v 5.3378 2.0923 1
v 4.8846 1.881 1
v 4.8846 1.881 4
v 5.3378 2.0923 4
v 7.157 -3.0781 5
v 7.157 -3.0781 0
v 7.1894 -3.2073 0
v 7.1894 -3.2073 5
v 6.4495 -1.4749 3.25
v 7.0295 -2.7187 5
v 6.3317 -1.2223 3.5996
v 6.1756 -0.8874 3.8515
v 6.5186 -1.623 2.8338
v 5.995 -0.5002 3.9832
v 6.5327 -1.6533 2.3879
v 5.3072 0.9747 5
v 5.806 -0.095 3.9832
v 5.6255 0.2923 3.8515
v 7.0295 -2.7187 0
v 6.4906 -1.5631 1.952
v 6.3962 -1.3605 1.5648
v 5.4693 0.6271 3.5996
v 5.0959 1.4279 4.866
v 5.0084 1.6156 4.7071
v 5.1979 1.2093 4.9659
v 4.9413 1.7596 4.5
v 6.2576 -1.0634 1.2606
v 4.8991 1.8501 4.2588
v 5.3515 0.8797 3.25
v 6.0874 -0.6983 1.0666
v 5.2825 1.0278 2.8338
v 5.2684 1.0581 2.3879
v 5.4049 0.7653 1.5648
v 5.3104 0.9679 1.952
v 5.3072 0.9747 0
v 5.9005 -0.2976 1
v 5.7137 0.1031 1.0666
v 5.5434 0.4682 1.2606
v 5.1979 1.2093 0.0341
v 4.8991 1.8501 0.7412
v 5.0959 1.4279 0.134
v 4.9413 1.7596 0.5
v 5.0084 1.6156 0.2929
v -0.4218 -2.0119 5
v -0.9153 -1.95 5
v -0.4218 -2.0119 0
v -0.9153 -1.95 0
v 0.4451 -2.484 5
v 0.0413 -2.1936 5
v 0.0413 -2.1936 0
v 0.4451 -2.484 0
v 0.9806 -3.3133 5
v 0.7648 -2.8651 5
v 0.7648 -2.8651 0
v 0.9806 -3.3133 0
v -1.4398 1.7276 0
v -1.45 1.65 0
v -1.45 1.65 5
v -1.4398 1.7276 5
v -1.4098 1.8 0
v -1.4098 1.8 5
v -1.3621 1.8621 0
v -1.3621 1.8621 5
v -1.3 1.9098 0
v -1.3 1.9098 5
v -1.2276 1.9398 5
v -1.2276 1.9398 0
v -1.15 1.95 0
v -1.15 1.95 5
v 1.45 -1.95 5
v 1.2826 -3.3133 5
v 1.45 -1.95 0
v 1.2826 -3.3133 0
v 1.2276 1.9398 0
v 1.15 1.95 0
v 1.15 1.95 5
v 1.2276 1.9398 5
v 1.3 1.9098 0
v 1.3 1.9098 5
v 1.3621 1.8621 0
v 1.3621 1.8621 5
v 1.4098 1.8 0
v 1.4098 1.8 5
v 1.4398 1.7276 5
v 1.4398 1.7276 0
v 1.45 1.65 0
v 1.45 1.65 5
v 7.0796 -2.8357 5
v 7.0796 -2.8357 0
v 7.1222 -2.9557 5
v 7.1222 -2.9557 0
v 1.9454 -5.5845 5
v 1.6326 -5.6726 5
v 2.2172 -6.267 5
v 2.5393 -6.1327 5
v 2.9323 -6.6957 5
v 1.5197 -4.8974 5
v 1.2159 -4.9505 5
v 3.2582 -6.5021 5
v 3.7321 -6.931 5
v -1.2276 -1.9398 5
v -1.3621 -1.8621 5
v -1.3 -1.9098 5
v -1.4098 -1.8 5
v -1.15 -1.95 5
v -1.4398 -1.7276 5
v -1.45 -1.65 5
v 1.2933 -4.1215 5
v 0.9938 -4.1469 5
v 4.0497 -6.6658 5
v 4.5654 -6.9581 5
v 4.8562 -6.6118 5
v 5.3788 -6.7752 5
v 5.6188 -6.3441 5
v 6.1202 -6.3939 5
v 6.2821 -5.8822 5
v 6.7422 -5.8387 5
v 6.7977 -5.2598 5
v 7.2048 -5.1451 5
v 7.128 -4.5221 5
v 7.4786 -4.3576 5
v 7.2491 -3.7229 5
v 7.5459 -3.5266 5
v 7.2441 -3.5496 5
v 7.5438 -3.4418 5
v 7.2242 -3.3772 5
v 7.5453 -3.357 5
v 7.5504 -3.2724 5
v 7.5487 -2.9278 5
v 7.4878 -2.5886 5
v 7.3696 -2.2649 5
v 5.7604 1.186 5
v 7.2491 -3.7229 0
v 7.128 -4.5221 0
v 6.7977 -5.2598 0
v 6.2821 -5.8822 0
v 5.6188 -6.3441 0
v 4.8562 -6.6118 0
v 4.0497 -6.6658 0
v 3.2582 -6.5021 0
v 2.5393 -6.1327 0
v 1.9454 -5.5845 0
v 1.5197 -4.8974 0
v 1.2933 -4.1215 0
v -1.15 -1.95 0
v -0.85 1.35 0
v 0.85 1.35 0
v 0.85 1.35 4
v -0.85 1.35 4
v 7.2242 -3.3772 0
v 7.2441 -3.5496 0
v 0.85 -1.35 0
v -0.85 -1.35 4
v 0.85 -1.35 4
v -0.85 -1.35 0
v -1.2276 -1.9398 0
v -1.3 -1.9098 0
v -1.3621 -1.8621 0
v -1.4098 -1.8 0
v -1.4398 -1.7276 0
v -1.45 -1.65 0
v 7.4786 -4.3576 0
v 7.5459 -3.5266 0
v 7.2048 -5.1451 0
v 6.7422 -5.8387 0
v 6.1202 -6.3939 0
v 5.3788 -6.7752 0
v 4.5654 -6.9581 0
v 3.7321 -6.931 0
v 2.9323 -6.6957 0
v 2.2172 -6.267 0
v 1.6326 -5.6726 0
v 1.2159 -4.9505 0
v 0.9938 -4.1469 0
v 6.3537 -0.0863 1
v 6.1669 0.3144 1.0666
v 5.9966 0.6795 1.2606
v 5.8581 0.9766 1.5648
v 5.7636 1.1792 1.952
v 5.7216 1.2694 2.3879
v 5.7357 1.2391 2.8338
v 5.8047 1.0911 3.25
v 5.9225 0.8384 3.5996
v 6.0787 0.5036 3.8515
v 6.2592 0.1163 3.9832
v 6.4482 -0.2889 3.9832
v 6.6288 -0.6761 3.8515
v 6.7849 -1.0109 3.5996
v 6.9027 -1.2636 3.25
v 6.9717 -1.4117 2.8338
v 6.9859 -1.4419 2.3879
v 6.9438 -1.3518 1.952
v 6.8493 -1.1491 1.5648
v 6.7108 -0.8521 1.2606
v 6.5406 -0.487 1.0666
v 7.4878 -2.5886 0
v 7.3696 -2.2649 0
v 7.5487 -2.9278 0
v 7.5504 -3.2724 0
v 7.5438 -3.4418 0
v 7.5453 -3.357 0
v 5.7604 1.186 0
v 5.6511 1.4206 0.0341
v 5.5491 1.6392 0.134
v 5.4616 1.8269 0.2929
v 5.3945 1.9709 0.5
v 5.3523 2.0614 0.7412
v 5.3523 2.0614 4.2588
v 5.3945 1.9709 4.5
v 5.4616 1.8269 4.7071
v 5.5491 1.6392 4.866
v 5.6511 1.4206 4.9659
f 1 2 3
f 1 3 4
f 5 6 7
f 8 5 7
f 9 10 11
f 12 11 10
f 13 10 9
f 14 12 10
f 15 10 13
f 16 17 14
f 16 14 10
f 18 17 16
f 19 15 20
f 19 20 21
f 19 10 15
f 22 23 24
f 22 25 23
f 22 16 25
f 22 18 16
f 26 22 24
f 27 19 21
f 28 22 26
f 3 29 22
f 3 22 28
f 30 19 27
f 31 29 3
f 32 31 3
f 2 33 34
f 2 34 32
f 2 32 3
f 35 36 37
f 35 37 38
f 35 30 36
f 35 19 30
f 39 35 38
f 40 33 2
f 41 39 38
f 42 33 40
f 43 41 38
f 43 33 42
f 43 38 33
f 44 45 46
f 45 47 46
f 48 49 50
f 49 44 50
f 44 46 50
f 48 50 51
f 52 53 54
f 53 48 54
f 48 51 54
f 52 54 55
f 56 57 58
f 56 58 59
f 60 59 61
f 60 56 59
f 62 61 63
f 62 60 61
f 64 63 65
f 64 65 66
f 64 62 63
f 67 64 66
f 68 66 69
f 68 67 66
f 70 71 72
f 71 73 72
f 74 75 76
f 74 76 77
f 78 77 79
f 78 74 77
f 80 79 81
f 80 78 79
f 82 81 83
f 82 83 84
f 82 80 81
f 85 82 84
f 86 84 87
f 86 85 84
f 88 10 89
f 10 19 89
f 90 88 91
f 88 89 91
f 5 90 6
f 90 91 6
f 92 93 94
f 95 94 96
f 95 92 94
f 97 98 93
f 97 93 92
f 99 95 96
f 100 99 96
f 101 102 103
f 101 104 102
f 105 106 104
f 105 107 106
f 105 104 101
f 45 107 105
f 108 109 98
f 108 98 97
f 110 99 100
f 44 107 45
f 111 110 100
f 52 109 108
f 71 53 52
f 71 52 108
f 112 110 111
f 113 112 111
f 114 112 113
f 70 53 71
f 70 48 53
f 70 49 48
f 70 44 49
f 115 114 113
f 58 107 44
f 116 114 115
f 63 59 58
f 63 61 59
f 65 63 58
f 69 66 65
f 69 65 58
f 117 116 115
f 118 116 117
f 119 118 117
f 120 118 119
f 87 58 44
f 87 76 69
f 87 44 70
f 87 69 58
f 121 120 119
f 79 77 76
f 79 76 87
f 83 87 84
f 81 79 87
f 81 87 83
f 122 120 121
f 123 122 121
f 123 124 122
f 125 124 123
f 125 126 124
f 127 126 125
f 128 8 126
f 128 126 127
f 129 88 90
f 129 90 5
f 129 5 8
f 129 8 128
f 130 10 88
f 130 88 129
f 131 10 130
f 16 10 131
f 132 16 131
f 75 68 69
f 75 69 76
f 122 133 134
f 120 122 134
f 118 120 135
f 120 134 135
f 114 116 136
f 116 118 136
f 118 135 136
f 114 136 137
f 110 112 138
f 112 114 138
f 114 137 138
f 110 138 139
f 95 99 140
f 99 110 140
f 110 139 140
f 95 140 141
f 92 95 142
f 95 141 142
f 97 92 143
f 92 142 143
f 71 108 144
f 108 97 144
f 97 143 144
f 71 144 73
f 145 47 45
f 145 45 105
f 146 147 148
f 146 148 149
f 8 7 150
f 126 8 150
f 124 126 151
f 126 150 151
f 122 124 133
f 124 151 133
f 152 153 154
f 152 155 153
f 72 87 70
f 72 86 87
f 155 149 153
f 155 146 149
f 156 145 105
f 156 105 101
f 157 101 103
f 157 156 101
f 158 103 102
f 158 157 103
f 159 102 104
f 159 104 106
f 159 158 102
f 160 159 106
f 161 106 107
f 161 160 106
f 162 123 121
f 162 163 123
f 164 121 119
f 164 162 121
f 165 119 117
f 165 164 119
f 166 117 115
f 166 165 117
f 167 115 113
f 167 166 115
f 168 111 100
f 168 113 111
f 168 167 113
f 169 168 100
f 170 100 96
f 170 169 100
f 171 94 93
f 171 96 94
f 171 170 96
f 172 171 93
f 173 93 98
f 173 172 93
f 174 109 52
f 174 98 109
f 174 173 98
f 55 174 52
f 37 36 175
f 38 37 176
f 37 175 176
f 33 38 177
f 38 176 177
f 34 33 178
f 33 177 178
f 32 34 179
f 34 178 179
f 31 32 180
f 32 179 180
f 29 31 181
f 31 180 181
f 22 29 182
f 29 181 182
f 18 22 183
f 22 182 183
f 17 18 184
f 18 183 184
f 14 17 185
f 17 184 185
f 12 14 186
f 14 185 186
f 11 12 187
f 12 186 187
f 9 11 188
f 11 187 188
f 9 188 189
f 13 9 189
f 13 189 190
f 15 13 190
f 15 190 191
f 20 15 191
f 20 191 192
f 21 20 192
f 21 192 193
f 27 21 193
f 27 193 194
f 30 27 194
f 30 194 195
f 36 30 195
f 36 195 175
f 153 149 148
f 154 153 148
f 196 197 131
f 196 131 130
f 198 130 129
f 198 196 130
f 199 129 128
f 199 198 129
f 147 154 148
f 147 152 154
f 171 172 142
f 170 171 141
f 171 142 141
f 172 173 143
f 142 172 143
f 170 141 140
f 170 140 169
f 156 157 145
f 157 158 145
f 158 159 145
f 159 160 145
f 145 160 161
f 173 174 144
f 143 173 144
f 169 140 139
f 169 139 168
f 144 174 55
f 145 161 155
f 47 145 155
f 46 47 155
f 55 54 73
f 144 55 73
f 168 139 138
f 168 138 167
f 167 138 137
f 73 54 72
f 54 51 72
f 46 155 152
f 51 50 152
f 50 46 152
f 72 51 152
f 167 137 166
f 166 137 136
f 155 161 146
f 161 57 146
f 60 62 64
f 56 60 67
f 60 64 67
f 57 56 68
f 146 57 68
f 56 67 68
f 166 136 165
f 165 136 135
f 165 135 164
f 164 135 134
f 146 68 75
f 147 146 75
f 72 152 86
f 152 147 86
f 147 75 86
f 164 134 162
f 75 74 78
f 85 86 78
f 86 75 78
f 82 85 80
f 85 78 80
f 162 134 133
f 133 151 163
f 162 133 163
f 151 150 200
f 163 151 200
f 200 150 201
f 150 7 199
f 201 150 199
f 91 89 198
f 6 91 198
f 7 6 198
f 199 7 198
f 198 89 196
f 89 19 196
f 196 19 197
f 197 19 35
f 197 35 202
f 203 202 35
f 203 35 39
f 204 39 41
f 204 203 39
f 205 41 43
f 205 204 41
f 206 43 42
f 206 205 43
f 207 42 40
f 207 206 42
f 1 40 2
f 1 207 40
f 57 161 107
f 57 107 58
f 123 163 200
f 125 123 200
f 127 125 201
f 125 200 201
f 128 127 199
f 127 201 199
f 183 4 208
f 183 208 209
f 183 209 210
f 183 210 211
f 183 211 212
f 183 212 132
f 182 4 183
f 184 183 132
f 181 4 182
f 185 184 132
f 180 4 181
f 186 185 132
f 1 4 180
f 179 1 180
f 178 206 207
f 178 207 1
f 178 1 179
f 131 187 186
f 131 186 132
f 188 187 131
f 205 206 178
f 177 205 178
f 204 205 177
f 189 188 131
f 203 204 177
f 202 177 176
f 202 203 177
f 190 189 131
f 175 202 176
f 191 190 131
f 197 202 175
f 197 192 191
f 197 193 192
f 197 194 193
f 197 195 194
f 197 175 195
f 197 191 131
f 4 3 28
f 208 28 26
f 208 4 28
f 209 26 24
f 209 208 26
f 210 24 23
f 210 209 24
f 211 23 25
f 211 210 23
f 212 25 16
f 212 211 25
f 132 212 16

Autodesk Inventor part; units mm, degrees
ref_plane "YZ Plane" through (0, 0, 0) normal (1, 0, 0) x (0, 1, 0)
ref_plane "XZ Plane" through (0, 0, 0) normal (0, 1, 0) x (-1, 0, 0)
ref_plane "XY Plane" through (0, 0, 0) normal (0, 0, 1) x (1, 0, 0)
sketch "Sketch1" plane through (0, 0, 0) normal (0, 0, 1) x (1, 0, 0)
  line L0 (-0.85, -1.35) -> (0.85, -1.35)
  line L1 (0.85, -1.35) -> (0.85, 1.35)
  line L2 (0.85, 1.35) -> (-0.85, 1.35)
  line L3 (-0.85, 1.35) -> (-0.85, -1.35)
  line L4 (-0.85, -1.35) -> (0.85, 1.35) construction
  line L5 (0.85, -1.35) -> (-0.85, 1.35) construction
  line L6 (7.1105, -2.8923) -> (4.8846, 1.881)
  line L7 (4.8846, 1.881) -> (5.3378, 2.0923)
  line L8 (5.3378, 2.0923) -> (7.6622, -2.8923)
  line L9 (-1.45, 1.95) -> (1.45, 1.95)
  line L10 (1.45, 1.95) -> (1.45, -1.95)
  line L11 (1.148, -1.95) -> (-1.45, -1.95)
  line L12 (-1.45, -1.95) -> (-1.45, 1.95)
  line L13 (1.45, -1.95) -> (1.148, -1.95) construction
  line L14 (1.148, -1.95) -> (0.9806, -3.3133)
  line L15 (0.9806, -3.3133) -> (1.2826, -3.3133) construction
  line L16 (1.2826, -3.3133) -> (1.45, -1.95)
  line L17 (7.6622, -2.8923) -> (7.1105, -2.8923) construction
  line L18 (7.2357, -3.3923) -> (7.537, -3.3923) construction
  arc A0 (1.2826, -3.3133) -> (7.2357, -3.3923) centre (4.2548, -3.6783) ccw
  arc A1 (0.9806, -3.3133) -> (7.537, -3.3923) centre (4.2548, -3.6783) ccw
  line L19 (7.537, -3.3923) -> (7.6622, -2.8923)
  line L20 (7.1105, -2.8923) -> (7.2357, -3.3923)
  point P0 (0, 0)
  point P1 (6.5, -0.4)
  dimension "d0" = 1.7
  dimension "d1" = 2.7
  dimension "d4" = 0.5
  dimension "d5" = 5.5
  dimension "d16" = 0.6
  dimension "d17" = 0.6
  dimension "d18" = 0.6
  dimension "d19" = 0.6
  dimension "d20" = 25
  dimension "d21" = 6.5
  dimension "d22" = 0.3
  dimension "d25" = 0.5
  dimension "d38" = 83
  dimension "d39" = 0.4
extrude "Extrusion1" add sketch "Sketch1" along normal blind 5
fillet "Fillet1" radius 2 5 edges at (1.148, -1.95, 2.5) (7.537, -3.3923, 2.5) (7.6622, -2.8923, 2.5) (7.1105, -2.8923, 2.5) (7.2357, -3.3923, 2.5)
fillet "Fillet1" radius 0.3 3 edges at (-1.45, -1.95, 2.5) (-1.45, 1.95, 2.5) (1.45, 1.95, 2.5)
sketch "Sketch3" plane through (0, 0, 5) normal (0, 0, 1) x (1, 0, 0)
  line L0 (-0.85, 1.35) -> (0.85, 1.35) projected
  line L1 (-0.85, -1.35) -> (-0.85, 1.35) projected
  line L2 (0.85, 1.35) -> (0.85, -1.35) projected
  line L3 (0.85, -1.35) -> (-0.85, -1.35) projected
  point P0 (0, 0)
extrude "Extrusion3" add sketch "Sketch3" against normal blind 1
sketch "Sketch4" plane through (5.3378, 2.0923, 5) normal (0.9063078, 0.4226183, 0) x (0, 0, -1)
  line L0 (0, -4.8077) -> (5, 0) construction
  circle A0 centre (2.5, -2.4038) radius 1.5
  line L1 (0, -4.8077) -> (0, 0) projected
  line L2 (5, -4.8077) -> (5, 0) projected
  dimension "d33" = 3
extrude "Extrusion4" cut sketch "Sketch4" against normal up to surface (0.5 mm away)
fillet "Fillet3" radius 1 2 edges at (5.1112, 1.9867, 0) (5.1112, 1.9867, 5)
properties part number "ValveSpring"
